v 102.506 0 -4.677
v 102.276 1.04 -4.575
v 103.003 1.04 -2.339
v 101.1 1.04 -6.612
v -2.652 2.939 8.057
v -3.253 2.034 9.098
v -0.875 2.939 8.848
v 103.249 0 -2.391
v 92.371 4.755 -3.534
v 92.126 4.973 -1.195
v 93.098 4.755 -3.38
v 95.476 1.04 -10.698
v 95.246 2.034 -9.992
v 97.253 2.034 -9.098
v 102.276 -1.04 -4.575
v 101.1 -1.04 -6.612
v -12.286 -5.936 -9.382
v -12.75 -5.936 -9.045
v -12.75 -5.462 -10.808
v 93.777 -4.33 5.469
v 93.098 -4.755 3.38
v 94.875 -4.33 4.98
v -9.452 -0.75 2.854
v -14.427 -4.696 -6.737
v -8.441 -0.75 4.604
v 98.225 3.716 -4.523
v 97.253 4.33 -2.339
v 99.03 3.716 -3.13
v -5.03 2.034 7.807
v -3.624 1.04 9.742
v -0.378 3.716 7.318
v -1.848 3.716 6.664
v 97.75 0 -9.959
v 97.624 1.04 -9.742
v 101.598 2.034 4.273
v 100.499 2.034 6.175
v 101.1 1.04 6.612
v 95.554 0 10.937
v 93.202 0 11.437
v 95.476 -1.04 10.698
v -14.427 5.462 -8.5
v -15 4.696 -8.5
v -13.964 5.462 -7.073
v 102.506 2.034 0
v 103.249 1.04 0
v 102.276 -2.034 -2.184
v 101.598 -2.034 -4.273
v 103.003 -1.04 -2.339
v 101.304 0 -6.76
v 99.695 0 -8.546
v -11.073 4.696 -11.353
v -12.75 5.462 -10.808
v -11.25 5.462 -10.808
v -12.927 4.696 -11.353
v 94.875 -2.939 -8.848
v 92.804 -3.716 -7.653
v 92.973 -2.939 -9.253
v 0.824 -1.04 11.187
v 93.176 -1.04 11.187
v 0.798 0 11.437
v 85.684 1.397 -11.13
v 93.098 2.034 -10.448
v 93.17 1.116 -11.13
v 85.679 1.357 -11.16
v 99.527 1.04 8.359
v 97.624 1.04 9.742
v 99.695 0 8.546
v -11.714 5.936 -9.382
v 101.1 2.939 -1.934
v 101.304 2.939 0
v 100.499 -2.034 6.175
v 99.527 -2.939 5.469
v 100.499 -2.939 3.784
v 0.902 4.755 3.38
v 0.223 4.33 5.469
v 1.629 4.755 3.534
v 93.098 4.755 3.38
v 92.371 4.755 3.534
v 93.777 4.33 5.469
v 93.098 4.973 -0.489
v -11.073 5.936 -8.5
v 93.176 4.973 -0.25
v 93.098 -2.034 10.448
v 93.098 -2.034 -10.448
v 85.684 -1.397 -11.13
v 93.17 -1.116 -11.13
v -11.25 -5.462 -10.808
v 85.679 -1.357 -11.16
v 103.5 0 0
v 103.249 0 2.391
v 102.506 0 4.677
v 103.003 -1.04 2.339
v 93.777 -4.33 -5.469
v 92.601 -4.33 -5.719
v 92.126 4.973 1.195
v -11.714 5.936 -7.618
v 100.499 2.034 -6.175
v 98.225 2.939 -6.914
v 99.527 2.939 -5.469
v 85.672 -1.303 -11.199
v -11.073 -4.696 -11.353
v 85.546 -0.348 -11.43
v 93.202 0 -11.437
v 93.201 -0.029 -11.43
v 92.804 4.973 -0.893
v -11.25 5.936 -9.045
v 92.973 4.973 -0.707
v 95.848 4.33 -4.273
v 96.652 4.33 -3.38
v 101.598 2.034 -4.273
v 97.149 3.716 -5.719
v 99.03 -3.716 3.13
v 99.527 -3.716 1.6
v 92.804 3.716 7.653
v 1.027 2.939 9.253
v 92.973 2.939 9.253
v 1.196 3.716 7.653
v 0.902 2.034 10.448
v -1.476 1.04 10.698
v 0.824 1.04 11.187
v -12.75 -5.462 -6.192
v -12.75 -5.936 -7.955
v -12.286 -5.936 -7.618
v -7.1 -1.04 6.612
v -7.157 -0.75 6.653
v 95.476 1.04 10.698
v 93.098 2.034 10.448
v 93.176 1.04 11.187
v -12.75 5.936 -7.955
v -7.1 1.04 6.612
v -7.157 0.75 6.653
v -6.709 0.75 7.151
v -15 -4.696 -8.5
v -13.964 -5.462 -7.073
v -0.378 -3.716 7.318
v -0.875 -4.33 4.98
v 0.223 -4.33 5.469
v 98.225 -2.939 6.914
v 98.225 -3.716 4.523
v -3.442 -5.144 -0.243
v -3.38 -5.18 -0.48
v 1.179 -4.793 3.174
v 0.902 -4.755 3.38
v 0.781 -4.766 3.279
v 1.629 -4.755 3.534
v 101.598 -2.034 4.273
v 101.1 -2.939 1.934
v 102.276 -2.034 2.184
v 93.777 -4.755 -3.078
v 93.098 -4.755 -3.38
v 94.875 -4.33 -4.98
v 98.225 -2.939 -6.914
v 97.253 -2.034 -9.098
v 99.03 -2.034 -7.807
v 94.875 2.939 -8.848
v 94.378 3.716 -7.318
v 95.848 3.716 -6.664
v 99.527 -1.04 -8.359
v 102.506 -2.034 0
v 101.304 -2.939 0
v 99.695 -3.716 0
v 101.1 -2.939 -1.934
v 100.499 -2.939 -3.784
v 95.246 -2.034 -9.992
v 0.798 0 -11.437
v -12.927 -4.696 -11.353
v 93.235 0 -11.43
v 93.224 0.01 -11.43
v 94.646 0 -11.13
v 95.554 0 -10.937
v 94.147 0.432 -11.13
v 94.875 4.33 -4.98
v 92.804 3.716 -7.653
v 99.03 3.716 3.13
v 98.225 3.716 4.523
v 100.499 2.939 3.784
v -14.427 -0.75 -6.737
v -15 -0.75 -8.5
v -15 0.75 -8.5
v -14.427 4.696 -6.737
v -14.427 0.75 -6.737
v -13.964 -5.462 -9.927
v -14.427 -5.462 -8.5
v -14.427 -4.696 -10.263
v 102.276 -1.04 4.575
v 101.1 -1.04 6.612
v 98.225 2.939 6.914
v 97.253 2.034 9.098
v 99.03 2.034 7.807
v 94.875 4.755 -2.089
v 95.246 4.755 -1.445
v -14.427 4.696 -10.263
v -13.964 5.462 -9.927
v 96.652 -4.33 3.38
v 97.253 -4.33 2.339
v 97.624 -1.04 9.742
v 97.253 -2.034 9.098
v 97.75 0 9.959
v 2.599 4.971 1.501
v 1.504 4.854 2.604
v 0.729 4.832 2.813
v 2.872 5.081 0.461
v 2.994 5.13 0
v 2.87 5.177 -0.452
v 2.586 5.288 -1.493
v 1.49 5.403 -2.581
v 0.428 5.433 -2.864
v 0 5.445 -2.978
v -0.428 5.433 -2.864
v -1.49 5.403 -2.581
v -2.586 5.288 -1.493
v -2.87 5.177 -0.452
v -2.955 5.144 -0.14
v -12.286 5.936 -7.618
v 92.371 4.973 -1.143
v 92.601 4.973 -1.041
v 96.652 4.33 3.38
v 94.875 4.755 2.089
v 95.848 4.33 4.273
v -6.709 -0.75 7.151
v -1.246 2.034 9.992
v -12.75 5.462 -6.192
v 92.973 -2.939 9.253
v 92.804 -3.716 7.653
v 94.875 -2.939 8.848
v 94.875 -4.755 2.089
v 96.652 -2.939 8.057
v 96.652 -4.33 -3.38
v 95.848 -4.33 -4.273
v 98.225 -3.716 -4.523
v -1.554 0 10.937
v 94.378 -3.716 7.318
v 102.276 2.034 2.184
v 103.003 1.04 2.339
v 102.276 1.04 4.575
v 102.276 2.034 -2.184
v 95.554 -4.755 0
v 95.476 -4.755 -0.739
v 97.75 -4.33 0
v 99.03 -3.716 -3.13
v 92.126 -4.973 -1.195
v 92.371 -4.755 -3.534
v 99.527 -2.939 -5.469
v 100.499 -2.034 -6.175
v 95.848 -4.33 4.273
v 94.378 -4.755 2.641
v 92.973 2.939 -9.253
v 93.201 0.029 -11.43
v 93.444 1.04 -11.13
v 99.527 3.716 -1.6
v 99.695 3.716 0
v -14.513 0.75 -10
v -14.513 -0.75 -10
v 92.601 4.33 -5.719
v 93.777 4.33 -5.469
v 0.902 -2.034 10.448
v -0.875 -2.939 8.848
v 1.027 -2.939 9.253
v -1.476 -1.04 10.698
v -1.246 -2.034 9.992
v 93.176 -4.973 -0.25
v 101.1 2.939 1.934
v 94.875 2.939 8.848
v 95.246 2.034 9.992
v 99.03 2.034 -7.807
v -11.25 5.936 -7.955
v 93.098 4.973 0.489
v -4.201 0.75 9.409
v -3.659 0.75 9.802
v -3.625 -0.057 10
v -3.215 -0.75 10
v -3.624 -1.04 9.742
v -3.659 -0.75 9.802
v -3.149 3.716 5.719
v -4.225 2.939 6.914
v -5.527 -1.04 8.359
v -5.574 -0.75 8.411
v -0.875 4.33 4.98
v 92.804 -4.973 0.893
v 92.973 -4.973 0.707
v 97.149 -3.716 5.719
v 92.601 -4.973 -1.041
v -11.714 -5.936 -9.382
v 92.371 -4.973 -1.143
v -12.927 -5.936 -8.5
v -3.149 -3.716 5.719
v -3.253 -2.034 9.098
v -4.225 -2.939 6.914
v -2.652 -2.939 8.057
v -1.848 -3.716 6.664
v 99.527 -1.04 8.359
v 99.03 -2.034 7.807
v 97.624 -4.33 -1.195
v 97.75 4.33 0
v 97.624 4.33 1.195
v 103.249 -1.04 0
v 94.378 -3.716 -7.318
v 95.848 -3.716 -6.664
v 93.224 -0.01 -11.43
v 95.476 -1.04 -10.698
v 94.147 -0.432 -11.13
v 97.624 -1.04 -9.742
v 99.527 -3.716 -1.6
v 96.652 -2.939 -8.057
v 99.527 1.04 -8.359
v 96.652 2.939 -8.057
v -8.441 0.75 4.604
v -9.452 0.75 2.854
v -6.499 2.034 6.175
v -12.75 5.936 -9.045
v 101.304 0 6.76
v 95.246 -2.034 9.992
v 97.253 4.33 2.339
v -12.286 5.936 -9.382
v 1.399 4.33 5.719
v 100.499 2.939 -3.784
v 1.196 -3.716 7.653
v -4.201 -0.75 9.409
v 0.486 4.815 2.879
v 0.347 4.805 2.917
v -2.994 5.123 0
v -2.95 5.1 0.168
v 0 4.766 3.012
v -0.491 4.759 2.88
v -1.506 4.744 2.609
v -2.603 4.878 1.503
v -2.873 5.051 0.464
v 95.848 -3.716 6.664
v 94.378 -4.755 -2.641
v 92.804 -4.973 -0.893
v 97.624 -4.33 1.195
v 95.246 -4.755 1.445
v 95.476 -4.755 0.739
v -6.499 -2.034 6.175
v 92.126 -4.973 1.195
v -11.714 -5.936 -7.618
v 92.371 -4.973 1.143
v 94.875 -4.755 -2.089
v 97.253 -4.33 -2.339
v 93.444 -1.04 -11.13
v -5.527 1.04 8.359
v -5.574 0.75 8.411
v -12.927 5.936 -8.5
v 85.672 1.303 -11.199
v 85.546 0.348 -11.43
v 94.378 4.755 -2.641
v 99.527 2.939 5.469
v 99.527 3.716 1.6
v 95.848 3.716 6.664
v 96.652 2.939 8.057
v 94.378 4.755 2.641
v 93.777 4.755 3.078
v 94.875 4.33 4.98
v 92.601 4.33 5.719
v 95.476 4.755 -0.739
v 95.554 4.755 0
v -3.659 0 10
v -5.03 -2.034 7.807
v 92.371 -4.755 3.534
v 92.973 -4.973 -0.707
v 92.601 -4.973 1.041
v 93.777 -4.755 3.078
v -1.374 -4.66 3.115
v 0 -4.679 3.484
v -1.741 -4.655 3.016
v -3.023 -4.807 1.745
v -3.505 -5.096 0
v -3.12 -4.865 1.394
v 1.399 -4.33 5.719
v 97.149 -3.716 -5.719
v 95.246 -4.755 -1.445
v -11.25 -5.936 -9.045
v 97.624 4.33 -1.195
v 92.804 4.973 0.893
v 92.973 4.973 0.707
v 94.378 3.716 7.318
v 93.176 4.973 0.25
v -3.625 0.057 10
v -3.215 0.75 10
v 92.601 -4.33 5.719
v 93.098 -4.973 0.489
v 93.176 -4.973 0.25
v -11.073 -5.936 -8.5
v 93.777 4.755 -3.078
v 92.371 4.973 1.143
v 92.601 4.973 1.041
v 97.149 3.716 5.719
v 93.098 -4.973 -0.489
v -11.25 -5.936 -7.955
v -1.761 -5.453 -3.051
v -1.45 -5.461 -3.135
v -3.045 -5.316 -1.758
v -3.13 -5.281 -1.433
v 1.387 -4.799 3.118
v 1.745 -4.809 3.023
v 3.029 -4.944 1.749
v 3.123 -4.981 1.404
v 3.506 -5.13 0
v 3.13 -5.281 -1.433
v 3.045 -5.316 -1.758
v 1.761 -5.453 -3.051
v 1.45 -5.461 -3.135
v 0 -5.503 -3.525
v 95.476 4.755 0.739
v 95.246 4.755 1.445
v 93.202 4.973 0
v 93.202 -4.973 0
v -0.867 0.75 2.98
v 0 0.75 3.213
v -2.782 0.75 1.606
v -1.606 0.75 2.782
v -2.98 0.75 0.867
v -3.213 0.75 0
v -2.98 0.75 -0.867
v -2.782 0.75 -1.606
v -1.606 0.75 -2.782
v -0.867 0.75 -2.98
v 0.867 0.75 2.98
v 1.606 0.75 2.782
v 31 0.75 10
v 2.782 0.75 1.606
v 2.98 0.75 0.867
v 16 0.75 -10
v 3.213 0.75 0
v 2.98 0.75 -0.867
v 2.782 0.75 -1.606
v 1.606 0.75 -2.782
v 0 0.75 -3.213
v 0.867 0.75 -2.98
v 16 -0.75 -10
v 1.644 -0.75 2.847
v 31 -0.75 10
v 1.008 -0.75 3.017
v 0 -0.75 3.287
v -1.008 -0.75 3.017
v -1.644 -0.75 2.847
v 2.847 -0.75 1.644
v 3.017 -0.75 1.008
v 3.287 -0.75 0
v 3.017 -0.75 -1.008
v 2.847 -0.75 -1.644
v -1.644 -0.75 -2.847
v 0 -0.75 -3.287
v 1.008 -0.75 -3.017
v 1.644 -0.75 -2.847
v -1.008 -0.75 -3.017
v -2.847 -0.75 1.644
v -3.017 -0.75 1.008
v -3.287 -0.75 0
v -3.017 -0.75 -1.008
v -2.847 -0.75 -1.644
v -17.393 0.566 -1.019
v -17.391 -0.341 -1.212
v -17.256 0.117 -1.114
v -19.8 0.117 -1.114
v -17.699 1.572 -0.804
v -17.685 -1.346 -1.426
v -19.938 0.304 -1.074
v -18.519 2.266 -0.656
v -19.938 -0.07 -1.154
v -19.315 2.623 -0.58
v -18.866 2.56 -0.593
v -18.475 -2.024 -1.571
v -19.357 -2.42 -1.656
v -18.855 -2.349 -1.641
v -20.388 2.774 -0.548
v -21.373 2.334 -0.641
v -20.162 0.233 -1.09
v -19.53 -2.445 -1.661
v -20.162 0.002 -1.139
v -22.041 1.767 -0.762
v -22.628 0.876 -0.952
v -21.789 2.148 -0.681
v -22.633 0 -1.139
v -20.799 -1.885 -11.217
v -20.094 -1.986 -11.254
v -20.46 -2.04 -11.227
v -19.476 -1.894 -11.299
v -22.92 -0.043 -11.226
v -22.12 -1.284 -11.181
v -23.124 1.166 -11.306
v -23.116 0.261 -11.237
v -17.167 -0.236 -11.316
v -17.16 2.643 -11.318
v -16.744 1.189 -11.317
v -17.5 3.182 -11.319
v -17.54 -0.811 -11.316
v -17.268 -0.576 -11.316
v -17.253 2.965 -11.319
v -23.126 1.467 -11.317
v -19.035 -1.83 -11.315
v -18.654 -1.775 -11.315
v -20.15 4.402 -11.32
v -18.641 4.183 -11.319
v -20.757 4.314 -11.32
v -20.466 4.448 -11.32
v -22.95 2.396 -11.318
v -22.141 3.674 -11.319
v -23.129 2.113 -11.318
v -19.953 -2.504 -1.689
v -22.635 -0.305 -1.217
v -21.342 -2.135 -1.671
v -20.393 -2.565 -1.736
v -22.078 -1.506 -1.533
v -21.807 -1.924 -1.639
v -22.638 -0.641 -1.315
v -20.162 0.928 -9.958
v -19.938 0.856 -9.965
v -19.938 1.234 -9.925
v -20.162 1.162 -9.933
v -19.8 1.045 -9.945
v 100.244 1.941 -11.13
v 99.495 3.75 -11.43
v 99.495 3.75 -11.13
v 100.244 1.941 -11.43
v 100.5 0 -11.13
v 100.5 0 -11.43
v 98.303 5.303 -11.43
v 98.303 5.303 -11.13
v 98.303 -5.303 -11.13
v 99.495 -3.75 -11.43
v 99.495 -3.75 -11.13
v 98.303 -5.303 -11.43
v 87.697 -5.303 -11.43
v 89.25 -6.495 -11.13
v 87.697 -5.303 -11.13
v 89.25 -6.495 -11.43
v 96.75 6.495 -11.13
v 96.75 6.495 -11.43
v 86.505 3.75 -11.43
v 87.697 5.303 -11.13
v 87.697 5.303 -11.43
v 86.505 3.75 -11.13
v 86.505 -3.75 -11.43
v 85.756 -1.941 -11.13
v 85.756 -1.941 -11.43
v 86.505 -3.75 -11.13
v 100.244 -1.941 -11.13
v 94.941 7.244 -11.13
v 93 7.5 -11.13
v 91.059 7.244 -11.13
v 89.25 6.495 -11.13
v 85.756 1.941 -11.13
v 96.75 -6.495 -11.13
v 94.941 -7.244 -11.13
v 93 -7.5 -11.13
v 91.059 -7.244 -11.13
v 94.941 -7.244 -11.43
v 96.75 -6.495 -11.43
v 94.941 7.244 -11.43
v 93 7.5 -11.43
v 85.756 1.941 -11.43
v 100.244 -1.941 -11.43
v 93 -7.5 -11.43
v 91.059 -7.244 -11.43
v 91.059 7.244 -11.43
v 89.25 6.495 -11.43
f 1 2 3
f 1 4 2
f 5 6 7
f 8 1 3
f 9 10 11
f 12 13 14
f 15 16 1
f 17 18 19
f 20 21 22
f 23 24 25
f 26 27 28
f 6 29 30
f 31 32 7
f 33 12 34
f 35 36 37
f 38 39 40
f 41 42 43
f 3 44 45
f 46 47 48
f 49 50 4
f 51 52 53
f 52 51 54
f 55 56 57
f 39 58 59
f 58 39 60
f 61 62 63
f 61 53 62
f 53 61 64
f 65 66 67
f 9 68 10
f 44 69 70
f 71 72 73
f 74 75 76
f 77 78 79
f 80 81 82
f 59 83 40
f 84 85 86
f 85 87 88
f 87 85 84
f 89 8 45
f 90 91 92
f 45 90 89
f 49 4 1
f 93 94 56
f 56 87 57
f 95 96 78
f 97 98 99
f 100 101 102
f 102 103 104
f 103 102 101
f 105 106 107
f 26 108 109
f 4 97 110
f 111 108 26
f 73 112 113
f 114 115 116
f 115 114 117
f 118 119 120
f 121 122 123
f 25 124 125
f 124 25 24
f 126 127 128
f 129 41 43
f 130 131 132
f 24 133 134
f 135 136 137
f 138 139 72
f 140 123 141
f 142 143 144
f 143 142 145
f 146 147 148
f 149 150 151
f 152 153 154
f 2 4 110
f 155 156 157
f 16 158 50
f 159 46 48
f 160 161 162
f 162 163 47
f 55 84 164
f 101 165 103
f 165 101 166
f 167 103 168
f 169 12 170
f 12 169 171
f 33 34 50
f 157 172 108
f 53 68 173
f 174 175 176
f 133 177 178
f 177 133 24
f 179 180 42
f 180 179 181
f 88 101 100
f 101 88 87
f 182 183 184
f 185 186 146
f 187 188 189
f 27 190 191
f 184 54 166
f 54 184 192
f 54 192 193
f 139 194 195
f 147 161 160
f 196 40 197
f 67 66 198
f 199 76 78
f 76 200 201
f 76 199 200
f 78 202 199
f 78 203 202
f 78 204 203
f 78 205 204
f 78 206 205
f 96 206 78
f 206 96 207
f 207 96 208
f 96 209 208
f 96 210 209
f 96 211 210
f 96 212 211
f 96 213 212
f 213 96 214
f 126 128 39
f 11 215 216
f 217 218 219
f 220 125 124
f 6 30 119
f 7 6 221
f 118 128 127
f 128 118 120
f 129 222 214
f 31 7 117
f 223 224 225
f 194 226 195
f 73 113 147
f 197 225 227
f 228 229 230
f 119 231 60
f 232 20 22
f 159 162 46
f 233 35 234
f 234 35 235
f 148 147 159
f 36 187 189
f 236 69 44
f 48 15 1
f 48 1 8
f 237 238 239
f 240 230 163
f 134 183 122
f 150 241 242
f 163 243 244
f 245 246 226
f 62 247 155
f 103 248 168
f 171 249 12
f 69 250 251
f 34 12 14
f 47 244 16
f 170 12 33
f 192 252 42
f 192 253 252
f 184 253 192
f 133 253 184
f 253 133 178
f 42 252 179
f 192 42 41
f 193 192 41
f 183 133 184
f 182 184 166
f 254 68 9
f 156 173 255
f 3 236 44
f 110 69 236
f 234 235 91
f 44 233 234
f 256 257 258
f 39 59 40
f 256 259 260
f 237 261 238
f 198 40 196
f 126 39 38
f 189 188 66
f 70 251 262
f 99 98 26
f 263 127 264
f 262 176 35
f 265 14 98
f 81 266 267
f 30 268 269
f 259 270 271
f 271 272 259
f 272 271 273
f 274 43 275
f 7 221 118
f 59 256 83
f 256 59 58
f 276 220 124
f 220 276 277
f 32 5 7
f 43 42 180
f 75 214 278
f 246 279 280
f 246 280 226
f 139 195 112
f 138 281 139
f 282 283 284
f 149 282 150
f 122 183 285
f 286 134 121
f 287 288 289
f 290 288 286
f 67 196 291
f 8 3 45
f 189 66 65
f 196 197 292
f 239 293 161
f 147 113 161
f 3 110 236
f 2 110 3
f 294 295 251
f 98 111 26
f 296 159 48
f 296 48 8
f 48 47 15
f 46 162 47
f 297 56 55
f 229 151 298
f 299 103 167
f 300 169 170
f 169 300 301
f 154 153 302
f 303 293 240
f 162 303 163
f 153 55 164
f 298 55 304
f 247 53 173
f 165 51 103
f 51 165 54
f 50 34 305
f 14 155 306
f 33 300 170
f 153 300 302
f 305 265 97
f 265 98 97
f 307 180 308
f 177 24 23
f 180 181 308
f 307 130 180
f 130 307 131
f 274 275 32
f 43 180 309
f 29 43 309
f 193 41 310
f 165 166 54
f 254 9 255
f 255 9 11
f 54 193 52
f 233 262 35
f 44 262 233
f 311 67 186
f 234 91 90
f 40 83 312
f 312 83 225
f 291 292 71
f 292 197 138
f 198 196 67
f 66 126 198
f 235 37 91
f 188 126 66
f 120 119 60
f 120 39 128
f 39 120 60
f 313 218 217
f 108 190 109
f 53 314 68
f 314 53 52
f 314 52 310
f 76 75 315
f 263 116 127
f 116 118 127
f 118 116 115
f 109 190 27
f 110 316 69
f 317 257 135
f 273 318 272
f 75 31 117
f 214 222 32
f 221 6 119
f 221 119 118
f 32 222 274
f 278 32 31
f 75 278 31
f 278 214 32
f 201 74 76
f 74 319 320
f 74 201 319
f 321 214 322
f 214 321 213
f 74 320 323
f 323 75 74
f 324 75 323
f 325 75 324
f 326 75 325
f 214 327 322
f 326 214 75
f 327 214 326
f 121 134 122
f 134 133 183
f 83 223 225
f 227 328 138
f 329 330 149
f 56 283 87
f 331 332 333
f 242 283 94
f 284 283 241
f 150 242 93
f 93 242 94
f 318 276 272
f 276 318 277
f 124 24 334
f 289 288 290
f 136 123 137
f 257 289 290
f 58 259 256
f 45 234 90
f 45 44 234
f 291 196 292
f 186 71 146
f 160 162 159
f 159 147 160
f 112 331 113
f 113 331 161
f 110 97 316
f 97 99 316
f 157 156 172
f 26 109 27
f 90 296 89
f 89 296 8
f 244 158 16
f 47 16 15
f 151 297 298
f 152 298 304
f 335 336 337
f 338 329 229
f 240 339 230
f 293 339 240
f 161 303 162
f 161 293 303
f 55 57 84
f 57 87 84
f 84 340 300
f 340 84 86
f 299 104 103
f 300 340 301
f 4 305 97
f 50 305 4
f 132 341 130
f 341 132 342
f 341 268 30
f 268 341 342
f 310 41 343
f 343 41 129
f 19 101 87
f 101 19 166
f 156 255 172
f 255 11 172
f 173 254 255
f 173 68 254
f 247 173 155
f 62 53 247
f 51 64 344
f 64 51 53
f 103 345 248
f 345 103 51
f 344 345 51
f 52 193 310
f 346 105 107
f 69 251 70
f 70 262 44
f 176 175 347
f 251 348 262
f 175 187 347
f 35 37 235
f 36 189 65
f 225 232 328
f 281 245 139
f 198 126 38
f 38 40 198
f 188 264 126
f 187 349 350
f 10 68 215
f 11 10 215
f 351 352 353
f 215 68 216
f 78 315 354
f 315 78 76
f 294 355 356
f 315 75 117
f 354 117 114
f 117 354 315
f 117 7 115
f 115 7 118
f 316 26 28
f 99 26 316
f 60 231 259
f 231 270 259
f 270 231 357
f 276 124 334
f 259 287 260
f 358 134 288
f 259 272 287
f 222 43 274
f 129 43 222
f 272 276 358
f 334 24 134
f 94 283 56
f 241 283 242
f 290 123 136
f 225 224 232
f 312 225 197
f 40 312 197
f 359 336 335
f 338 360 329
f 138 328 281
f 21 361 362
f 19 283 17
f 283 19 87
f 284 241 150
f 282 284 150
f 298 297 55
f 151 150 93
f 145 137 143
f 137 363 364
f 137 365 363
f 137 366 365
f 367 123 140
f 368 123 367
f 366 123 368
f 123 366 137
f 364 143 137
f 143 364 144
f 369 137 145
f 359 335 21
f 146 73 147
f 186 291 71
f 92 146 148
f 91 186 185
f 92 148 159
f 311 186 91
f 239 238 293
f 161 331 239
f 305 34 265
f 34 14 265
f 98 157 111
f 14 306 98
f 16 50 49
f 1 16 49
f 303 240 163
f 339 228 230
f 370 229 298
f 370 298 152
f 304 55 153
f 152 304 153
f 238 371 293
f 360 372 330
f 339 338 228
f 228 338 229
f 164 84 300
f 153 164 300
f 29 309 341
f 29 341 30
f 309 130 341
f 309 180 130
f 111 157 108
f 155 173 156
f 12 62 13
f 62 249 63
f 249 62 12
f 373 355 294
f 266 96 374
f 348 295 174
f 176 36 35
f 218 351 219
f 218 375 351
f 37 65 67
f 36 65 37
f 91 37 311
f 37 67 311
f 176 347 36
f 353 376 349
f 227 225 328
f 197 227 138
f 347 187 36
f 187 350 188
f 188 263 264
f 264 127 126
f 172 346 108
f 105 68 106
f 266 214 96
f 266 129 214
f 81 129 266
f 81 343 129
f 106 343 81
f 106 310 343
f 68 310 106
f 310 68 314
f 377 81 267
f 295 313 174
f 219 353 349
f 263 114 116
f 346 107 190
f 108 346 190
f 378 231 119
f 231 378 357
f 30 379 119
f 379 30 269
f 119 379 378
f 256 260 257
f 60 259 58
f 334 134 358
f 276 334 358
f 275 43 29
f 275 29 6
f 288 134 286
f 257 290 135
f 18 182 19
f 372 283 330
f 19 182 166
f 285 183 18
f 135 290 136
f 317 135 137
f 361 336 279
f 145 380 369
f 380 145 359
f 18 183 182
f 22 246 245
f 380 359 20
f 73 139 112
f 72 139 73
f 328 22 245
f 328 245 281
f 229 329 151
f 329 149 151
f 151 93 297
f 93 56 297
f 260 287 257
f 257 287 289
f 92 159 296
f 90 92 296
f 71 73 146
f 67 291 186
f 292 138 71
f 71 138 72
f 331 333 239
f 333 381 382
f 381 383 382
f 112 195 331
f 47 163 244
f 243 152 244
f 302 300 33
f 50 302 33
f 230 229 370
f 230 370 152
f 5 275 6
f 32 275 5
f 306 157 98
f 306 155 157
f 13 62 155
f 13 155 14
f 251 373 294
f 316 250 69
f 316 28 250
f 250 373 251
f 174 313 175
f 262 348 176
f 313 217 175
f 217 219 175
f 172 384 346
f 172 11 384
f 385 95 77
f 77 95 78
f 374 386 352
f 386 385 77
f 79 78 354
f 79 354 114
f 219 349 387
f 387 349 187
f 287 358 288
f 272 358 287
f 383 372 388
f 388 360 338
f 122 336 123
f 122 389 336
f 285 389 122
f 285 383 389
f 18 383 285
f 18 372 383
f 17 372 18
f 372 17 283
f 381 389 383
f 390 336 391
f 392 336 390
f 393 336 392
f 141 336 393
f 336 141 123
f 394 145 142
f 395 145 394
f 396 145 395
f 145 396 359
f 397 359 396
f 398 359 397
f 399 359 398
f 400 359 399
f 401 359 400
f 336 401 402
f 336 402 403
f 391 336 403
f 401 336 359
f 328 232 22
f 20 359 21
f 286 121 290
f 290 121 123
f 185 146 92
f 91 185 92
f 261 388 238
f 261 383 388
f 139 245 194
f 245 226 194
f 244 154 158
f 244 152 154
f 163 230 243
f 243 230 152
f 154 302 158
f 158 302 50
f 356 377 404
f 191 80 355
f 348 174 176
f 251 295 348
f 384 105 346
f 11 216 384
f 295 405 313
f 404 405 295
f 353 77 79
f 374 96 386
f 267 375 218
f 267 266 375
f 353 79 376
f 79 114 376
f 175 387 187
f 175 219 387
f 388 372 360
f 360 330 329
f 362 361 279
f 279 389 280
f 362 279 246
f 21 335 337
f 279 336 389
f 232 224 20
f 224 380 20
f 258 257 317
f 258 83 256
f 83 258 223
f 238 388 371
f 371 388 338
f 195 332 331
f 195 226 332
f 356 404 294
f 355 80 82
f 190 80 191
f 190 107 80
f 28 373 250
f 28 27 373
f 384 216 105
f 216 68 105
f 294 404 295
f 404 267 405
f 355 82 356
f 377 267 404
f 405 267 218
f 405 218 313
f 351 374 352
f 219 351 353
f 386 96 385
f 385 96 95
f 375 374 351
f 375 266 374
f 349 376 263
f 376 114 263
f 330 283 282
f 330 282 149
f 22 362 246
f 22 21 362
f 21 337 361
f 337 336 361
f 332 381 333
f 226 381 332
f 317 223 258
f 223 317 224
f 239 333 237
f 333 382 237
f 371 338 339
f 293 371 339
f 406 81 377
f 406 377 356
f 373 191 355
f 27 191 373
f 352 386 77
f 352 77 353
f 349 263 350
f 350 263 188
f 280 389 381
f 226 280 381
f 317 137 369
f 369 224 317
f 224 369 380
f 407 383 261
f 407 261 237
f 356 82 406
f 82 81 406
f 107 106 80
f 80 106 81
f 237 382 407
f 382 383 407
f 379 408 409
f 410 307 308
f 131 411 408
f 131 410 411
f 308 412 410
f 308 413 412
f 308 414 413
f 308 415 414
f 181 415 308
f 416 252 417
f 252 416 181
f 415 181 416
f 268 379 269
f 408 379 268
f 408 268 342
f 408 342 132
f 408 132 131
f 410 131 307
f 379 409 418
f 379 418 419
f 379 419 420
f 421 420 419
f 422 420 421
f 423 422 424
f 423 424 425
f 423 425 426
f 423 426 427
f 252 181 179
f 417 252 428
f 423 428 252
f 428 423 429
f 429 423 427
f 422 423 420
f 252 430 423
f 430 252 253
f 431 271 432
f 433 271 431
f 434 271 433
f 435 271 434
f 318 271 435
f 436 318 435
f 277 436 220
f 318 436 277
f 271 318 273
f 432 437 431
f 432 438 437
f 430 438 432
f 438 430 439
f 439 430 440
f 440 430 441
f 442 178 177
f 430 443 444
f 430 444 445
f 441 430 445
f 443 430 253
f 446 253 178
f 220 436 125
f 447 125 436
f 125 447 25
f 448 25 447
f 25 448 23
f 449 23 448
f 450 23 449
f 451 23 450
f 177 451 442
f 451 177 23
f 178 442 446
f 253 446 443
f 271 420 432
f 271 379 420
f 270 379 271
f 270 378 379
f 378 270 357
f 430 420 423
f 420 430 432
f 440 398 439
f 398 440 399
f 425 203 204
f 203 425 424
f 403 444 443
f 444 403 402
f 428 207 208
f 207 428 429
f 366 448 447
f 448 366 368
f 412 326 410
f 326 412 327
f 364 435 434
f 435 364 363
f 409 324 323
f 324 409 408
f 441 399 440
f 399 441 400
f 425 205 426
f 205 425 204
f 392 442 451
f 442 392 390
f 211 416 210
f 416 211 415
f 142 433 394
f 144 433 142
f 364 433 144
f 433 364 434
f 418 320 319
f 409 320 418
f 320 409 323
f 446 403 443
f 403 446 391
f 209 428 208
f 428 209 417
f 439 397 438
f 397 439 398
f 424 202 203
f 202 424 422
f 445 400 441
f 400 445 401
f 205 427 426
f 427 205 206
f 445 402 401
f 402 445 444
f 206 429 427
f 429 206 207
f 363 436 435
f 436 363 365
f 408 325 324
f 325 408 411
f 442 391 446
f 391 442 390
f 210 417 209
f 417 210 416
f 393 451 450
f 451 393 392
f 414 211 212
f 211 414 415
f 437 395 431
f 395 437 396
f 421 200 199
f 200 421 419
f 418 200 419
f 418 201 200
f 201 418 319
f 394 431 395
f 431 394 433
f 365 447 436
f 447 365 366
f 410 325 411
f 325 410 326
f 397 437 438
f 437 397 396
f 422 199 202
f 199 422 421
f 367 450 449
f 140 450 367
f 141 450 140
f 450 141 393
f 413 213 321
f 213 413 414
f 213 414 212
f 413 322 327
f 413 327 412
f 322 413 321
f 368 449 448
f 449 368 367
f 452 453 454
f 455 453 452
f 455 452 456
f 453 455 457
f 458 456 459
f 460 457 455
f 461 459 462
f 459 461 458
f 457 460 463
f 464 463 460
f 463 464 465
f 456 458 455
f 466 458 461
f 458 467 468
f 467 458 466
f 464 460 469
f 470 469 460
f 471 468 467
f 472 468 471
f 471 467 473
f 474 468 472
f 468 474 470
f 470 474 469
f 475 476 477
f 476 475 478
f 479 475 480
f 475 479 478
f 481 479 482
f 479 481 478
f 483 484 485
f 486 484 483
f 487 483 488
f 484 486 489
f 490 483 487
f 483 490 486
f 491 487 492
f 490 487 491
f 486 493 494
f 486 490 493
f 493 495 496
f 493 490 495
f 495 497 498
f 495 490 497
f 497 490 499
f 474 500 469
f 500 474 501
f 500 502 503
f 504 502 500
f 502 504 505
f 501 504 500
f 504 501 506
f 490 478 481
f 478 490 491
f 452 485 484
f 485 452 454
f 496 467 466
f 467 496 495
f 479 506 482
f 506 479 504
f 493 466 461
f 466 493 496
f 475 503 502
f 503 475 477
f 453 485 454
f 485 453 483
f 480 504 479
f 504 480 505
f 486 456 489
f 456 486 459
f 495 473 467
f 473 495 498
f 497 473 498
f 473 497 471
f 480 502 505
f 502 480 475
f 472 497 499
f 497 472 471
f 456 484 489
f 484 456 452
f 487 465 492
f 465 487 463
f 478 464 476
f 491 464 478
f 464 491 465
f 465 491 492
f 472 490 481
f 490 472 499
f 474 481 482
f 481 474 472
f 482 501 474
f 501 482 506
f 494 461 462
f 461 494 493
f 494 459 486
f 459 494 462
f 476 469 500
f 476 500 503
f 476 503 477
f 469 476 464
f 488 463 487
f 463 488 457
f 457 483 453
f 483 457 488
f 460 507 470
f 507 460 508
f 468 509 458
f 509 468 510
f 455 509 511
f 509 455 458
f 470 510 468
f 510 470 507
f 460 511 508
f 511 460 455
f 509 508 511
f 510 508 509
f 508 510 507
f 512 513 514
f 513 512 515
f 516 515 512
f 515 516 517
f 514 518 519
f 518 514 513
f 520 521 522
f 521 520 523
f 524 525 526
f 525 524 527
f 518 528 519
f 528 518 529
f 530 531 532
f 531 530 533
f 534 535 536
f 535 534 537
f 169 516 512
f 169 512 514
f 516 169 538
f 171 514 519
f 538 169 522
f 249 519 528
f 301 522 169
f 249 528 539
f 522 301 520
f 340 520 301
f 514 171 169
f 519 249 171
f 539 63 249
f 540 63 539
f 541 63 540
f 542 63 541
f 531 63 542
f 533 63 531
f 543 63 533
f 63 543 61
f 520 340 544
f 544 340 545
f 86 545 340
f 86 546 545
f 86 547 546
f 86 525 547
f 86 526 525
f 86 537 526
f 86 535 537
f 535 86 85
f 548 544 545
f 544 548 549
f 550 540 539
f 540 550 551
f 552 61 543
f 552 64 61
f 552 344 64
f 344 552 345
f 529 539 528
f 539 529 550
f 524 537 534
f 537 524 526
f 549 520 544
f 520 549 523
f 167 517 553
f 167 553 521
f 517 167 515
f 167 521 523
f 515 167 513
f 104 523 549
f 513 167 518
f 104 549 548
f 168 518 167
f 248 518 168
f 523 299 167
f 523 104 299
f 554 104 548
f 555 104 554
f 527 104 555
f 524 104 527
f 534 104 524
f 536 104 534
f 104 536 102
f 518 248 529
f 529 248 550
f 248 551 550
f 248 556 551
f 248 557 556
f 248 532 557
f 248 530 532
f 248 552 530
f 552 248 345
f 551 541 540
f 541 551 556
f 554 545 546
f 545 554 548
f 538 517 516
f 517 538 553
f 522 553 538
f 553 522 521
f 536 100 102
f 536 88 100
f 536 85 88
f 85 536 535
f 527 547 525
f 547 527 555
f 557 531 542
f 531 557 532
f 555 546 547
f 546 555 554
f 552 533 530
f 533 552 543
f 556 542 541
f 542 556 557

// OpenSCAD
/*
    A knife handle for use with disposable razor blade. These blades can be easily found in 
    DIY stores, and pound shops as well as supermarkets.
    It requires the classic shaped blades with a hole in the middle. I found them in a pound shop.

	The blade is held in place by a wedge.
	
	Print Notes.
	    You can use a low infill (I use 10%)
	    The back of the knife tends to lift off of the bed, so either use a brim, or use the
	    "splat" module to help it adhere.
*/

length = 120; // Length of the knife
width = 23; // Must be a little larger than the width of the blade.
thickness = 10; // Thickness of the knife
extraThickness = 2; // Taper the top front of the knife.

hole = 6; // Diameter of the hole/wedge which holds the blade.
taper = 1; // Amount of taper on the wedge
slack = 0.5; // How much smaller the wedge is to the hole that it fits into.

module body()
{
	foo = 3; // Radius of the extra spheres for the wider top. (For asthetics only)
	bar = extraThickness * width/thickness/2 + width / 2; // Z offset for the extra spheres.
	difference() {
		translate([-5,0,0]) scale( [1,1,thickness/width] ) hull() {
			translate( [7,0,0] ) sphere( d=width ); // Front
			translate( [length - width,0,0] ) sphere( d=width ); // Back
			translate( [-10+foo, width/2 - foo, bar-foo] ) sphere( r=foo ); // Wider top
			translate( [-10+foo, width/2 - foo,-bar+foo] ) sphere( r=foo ); // Wider top
		}
	}
}

module bladeHole( thickness=1.5 )
{
	height=20;
	width=62;
	translate([-width/2,-height/2,-thickness/2]) linear_extrude( thickness ) {
		polygon( [[0,0],[62,0],[width-15,height],[15,height]] );
	}
}

module knife()
{

	difference() {
		body( length, width, thickness, extraThickness );
		bladeHole(); // gap for blade to fit in.
		translate( [0,0,-thickness] ) cylinder( d1=hole+slack+taper, d2=hole+slack-taper, h=thickness*2 );
	}
}

module wedge(void=true)
{
	difference() {
		intersection() {
			body( length, width, thickness, extraThickness );
			translate( [0,0,-thickness] ) cylinder( d1=hole+taper, d2=hole-taper, h=thickness*2 );
		}
		if (void) {
		    // Create a tiny void, which will force the slicer to make it more solid!
		    #translate( [0,0,-width/4+2] ) cylinder( d=0.4, h=20+width/2-4 ); 
	    }
	}
}

/*
    A bodge to held the back of the knife adhere to the print bed.
*/
module splat(d=15, h=0.3 )
{
    translate([length-27,0,-11.43]) cylinder( d=d, h=h );
}

// Rotate the knife, so that the top of the knife is on the build plate.
rotate( [-90,0,0] ) knife();

// A little bit of a bodge to allow the wedge to be printed at the same time as the knife,
// and to make one edge of the wedge to be level with the build platform.
// If you change 'width', 'thickness' or 'extraThicknes', then the rotation and translation will need tweaking.
rotate( [6,0,0] ) translate( [-20,0,-width/4-0.5] ) wedge();

splat();
